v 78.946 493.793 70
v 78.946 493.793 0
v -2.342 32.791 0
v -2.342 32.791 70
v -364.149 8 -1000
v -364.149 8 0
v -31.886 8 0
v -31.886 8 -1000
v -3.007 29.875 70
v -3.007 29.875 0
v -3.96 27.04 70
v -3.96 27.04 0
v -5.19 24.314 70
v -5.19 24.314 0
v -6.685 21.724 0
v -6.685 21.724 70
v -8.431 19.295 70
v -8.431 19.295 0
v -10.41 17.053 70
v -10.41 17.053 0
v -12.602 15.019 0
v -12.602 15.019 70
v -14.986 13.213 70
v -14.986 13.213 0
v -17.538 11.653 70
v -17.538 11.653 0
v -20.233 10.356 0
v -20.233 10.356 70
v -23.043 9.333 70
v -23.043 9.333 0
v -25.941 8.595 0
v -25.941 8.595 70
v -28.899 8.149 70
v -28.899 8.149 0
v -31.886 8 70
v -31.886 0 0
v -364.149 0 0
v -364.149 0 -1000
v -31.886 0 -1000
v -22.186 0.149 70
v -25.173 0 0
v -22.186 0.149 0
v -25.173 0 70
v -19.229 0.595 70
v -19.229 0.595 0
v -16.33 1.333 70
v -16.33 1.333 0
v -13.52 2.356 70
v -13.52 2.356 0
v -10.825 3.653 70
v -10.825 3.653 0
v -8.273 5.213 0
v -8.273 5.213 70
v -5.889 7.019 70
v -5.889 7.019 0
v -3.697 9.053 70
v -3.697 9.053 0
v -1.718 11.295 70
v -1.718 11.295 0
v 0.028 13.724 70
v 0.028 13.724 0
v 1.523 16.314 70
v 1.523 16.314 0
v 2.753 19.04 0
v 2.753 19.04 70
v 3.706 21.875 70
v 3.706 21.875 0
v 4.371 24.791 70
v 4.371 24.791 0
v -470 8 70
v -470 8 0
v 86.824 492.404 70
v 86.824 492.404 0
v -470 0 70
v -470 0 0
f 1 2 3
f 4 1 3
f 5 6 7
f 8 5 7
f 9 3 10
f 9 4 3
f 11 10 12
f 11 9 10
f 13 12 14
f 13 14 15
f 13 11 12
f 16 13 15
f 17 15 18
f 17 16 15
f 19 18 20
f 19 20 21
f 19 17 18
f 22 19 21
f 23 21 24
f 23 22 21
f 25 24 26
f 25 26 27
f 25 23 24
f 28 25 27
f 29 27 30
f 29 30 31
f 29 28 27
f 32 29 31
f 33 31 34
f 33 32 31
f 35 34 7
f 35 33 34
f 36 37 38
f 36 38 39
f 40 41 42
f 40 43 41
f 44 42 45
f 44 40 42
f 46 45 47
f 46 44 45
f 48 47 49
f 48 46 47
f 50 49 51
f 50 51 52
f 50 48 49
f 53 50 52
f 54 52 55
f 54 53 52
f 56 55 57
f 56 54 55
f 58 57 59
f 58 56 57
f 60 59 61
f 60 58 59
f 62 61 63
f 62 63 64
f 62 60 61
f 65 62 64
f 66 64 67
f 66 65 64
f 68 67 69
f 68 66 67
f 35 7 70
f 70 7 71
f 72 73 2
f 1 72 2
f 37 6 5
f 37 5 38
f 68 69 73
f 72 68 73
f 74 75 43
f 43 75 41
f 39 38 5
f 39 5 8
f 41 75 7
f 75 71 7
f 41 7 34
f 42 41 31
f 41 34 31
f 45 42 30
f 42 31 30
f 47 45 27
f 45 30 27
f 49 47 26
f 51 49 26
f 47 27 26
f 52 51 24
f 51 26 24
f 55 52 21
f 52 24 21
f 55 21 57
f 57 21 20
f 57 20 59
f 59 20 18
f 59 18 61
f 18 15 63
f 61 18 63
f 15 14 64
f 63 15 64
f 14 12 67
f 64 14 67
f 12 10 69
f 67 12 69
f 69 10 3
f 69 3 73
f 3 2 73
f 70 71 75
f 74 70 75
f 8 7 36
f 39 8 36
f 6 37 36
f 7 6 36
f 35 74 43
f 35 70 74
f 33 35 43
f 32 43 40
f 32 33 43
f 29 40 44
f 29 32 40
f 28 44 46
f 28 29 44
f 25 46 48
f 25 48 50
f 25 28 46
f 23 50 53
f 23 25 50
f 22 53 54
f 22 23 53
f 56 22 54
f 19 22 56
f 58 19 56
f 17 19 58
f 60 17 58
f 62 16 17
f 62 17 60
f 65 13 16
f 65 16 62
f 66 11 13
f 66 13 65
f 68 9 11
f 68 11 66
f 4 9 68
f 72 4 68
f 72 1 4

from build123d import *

# Parameters (mm, degrees)
F1_DEPTH = 70
F2_R     = 30
F3_W     = 332.263635
F3_H     = 8
F4_DEPTH = 1000


with BuildPart() as f1:
    # F0 (on Top) → F1 (new body)
    with BuildSketch(Plane.XY):
        Polygon((-470, 0), (0, 0), (86.824089, 492.403877), (78.945627, 493.793062), (-6.712797, 8), (-470, 8), align=None)
    extrude(amount=F1_DEPTH)

    # F2
    f2_edges = [f1.edges().sort_by_distance(p)[0] for p in [
        (-6.712797, 8, 35),
        (0, 0, 35),
    ]]
    fillet(f2_edges, radius=F2_R)


with BuildPart() as f4:
    # F3 (on face) → F4 (new body)
    with BuildSketch(Plane(origin=(0, 0, 0), x_dir=(1, 0, 0), z_dir=(0, 0, -1))):
        with Locations((-198.017603, -4)):
            Rectangle(F3_W, F3_H)
    extrude(amount=F4_DEPTH)


solid = Compound([f1.part, f4.part])
